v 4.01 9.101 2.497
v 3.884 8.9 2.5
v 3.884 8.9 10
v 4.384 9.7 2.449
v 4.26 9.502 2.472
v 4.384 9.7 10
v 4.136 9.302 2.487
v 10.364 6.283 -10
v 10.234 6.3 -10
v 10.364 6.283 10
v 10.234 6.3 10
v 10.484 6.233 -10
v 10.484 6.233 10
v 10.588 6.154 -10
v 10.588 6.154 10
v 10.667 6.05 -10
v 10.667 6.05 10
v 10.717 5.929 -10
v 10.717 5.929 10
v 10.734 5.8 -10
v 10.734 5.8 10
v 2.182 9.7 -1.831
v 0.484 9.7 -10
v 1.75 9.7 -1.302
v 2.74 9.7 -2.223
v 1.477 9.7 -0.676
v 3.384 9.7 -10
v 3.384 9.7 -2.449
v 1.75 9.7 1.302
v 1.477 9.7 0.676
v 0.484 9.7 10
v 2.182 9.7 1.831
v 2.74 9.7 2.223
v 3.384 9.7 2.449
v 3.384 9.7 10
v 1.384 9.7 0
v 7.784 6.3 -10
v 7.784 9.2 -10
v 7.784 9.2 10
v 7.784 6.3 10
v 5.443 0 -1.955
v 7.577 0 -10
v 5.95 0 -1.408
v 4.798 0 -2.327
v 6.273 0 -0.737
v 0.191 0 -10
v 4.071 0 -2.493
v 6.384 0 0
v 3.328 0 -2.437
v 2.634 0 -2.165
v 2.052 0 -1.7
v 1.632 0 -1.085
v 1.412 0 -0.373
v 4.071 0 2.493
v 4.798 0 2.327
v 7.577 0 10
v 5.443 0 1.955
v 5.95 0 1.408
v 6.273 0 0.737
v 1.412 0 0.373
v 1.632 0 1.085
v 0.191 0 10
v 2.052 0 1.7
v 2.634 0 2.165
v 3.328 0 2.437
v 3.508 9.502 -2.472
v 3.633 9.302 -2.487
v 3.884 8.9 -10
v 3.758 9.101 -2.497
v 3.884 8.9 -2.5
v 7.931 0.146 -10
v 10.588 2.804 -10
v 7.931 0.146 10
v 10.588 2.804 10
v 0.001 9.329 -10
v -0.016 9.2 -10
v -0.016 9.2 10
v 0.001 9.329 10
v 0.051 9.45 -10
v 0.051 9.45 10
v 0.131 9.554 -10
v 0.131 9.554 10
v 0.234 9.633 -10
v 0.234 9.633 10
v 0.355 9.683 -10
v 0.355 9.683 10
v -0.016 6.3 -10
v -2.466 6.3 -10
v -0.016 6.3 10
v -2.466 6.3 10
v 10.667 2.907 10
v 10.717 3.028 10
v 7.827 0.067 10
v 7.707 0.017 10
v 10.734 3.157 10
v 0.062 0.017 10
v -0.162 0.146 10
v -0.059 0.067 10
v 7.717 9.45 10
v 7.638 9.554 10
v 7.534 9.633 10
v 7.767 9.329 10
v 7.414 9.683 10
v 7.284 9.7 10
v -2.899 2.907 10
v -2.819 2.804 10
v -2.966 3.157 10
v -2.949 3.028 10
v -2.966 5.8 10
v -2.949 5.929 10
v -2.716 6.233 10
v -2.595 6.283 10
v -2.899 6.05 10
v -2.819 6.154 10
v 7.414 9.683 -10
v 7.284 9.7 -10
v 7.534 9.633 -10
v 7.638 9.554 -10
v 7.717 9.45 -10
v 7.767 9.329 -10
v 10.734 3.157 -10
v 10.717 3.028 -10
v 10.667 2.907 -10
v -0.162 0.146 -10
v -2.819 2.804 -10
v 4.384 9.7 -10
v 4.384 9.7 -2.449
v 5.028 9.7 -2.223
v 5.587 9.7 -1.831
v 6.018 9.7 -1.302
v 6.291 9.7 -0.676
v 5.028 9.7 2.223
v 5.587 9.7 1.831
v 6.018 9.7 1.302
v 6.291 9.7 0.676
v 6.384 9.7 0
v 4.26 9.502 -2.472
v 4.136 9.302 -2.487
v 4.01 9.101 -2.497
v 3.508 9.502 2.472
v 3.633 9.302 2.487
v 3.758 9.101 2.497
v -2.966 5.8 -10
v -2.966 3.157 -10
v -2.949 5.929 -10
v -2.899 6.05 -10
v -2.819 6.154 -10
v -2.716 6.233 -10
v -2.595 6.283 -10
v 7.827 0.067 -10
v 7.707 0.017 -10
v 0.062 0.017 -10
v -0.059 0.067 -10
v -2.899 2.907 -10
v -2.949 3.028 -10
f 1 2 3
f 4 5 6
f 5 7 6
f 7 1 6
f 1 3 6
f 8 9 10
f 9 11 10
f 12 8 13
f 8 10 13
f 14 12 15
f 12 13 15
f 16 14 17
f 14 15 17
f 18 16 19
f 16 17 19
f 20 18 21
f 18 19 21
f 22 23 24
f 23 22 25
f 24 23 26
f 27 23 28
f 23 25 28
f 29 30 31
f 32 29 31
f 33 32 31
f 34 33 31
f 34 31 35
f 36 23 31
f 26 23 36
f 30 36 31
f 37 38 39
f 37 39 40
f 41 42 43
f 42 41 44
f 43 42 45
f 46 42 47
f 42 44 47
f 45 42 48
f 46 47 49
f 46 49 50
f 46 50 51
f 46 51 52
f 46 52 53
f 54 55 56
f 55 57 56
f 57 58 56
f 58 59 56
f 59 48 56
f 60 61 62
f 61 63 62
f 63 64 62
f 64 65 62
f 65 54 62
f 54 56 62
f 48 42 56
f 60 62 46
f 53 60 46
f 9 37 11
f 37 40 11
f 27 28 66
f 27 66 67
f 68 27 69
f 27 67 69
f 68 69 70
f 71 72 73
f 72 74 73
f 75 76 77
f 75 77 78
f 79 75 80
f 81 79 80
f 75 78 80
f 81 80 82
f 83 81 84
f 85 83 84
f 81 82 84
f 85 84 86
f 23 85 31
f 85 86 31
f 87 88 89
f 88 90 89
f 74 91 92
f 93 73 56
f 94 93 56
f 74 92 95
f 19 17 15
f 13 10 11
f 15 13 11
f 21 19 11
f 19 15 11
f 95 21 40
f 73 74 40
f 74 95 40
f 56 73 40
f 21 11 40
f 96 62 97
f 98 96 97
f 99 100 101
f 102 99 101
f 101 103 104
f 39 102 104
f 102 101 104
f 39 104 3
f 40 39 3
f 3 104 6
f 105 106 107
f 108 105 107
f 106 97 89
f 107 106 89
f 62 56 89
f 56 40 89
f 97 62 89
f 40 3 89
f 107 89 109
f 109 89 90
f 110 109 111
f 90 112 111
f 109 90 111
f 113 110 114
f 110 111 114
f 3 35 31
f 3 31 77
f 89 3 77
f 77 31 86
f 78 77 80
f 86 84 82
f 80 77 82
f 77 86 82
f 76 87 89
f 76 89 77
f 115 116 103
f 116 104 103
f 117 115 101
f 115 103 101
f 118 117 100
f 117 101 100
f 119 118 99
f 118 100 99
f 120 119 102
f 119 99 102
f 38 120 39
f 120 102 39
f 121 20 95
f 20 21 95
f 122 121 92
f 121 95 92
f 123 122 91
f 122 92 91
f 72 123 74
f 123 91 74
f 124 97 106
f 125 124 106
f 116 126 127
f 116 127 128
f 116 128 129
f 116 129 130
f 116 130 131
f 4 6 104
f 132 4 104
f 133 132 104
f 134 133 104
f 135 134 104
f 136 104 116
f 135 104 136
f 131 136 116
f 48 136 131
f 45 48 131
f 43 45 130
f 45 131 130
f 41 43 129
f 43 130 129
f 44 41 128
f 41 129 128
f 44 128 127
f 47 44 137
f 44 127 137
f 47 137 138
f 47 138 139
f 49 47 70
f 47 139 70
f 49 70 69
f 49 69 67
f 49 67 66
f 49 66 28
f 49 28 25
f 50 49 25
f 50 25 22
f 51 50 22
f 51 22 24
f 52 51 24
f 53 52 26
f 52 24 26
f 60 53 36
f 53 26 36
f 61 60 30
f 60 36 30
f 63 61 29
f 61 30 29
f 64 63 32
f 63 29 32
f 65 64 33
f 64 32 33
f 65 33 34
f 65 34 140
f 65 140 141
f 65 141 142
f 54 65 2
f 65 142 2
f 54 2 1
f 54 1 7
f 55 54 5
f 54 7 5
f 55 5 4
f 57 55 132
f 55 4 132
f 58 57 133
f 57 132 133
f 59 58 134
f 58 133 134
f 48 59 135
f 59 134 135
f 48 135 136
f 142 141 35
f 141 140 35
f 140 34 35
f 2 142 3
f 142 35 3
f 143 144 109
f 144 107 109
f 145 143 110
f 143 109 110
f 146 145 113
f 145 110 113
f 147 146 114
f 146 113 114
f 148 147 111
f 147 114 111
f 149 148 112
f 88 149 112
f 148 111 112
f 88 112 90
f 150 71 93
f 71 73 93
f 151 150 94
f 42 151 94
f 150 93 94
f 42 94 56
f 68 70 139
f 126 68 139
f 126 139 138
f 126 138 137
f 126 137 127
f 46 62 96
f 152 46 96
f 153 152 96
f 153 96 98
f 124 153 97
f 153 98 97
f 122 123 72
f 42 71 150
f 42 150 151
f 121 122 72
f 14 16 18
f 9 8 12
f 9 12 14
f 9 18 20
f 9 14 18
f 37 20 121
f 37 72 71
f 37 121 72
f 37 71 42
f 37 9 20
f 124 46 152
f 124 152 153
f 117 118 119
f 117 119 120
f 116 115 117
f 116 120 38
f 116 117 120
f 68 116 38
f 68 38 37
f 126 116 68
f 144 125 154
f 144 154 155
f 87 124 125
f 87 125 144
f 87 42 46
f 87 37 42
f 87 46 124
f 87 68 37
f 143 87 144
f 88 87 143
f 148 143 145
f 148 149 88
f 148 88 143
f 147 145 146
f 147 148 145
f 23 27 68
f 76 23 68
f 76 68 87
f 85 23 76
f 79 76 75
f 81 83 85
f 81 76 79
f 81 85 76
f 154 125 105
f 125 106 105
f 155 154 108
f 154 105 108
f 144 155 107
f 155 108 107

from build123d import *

# Parameters (mm, degrees)
EXTRUDE_1_DEPTH        = 10
HOLE_WIZARD_M6_1_D     = 5
HOLE_WIZARD_M6_1_DEPTH = 15
HOLE_WIZARD_M6_1_TIP   = 1.502151548


with BuildPart() as part:
    # 草图1 → 凸台-拉伸1 (new, symmetric)
    with BuildSketch(Plane.XY):
        with BuildLine():
            Line((-0.162211674, 0.146446609), (-2.819318456, 2.803553391))
            ThreePointArc((-2.819318456, 2.803553391), (-2.927704831, 2.965765065), (-2.965765065, 3.157106781))
            Line((-2.965765065, 3.157106781), (-2.965765065, 5.8))
            ThreePointArc((-2.965765065, 5.8), (-2.819318456, 6.153553391), (-2.465765065, 6.3))
            Line((-2.465765065, 6.3), (-0.015765065, 6.3))
            Line((-0.015765065, 6.3), (-0.015765065, 9.2))
            ThreePointArc((-0.015765065, 9.2), (0.130681544, 9.553553391), (0.484234935, 9.7))
            Line((0.484234935, 9.7), (3.384234935, 9.7))
            Line((3.384234935, 9.7), (3.884234935, 8.9))
            Line((3.884234935, 8.9), (4.384234935, 9.7))
            Line((4.384234935, 9.7), (7.284234935, 9.7))
            ThreePointArc((7.284234935, 9.7), (7.637788326, 9.553553391), (7.784234935, 9.2))
            Line((7.784234935, 9.2), (7.784234935, 6.3))
            Line((7.784234935, 6.3), (10.234234935, 6.3))
            ThreePointArc((10.234234935, 6.3), (10.587788326, 6.153553391), (10.734234935, 5.8))
            Line((10.734234935, 5.8), (10.734234935, 3.157106781))
            ThreePointArc((10.734234935, 3.157106781), (10.696174701, 2.965765065), (10.587788326, 2.803553391))
            Line((10.587788326, 2.803553391), (7.930681544, 0.146446609))
            ThreePointArc((7.930681544, 0.146446609), (7.76846987, 0.038060234), (7.577128154, 0))
            Line((7.577128154, 0), (0.191341716, 0))
            ThreePointArc((0.191341716, 0), (0, 0.038060234), (-0.162211674, 0.146446609))
        make_face()
    extrude(amount=EXTRUDE_1_DEPTH, both=True)

    # M6 螺纹孔1
    with Locations(Plane(origin=(3.884234935, 0, 0), x_dir=(-1, 0, 0), z_dir=(0, -1, 0))):
        with Locations((0, 0)):
            Hole(HOLE_WIZARD_M6_1_D / 2, depth=HOLE_WIZARD_M6_1_DEPTH)
            with Locations((0, 0, -(HOLE_WIZARD_M6_1_DEPTH + HOLE_WIZARD_M6_1_TIP / 2))):  # 118° drill point
                Cone(0, HOLE_WIZARD_M6_1_D / 2, HOLE_WIZARD_M6_1_TIP, mode=Mode.SUBTRACT)


solid = part.part
